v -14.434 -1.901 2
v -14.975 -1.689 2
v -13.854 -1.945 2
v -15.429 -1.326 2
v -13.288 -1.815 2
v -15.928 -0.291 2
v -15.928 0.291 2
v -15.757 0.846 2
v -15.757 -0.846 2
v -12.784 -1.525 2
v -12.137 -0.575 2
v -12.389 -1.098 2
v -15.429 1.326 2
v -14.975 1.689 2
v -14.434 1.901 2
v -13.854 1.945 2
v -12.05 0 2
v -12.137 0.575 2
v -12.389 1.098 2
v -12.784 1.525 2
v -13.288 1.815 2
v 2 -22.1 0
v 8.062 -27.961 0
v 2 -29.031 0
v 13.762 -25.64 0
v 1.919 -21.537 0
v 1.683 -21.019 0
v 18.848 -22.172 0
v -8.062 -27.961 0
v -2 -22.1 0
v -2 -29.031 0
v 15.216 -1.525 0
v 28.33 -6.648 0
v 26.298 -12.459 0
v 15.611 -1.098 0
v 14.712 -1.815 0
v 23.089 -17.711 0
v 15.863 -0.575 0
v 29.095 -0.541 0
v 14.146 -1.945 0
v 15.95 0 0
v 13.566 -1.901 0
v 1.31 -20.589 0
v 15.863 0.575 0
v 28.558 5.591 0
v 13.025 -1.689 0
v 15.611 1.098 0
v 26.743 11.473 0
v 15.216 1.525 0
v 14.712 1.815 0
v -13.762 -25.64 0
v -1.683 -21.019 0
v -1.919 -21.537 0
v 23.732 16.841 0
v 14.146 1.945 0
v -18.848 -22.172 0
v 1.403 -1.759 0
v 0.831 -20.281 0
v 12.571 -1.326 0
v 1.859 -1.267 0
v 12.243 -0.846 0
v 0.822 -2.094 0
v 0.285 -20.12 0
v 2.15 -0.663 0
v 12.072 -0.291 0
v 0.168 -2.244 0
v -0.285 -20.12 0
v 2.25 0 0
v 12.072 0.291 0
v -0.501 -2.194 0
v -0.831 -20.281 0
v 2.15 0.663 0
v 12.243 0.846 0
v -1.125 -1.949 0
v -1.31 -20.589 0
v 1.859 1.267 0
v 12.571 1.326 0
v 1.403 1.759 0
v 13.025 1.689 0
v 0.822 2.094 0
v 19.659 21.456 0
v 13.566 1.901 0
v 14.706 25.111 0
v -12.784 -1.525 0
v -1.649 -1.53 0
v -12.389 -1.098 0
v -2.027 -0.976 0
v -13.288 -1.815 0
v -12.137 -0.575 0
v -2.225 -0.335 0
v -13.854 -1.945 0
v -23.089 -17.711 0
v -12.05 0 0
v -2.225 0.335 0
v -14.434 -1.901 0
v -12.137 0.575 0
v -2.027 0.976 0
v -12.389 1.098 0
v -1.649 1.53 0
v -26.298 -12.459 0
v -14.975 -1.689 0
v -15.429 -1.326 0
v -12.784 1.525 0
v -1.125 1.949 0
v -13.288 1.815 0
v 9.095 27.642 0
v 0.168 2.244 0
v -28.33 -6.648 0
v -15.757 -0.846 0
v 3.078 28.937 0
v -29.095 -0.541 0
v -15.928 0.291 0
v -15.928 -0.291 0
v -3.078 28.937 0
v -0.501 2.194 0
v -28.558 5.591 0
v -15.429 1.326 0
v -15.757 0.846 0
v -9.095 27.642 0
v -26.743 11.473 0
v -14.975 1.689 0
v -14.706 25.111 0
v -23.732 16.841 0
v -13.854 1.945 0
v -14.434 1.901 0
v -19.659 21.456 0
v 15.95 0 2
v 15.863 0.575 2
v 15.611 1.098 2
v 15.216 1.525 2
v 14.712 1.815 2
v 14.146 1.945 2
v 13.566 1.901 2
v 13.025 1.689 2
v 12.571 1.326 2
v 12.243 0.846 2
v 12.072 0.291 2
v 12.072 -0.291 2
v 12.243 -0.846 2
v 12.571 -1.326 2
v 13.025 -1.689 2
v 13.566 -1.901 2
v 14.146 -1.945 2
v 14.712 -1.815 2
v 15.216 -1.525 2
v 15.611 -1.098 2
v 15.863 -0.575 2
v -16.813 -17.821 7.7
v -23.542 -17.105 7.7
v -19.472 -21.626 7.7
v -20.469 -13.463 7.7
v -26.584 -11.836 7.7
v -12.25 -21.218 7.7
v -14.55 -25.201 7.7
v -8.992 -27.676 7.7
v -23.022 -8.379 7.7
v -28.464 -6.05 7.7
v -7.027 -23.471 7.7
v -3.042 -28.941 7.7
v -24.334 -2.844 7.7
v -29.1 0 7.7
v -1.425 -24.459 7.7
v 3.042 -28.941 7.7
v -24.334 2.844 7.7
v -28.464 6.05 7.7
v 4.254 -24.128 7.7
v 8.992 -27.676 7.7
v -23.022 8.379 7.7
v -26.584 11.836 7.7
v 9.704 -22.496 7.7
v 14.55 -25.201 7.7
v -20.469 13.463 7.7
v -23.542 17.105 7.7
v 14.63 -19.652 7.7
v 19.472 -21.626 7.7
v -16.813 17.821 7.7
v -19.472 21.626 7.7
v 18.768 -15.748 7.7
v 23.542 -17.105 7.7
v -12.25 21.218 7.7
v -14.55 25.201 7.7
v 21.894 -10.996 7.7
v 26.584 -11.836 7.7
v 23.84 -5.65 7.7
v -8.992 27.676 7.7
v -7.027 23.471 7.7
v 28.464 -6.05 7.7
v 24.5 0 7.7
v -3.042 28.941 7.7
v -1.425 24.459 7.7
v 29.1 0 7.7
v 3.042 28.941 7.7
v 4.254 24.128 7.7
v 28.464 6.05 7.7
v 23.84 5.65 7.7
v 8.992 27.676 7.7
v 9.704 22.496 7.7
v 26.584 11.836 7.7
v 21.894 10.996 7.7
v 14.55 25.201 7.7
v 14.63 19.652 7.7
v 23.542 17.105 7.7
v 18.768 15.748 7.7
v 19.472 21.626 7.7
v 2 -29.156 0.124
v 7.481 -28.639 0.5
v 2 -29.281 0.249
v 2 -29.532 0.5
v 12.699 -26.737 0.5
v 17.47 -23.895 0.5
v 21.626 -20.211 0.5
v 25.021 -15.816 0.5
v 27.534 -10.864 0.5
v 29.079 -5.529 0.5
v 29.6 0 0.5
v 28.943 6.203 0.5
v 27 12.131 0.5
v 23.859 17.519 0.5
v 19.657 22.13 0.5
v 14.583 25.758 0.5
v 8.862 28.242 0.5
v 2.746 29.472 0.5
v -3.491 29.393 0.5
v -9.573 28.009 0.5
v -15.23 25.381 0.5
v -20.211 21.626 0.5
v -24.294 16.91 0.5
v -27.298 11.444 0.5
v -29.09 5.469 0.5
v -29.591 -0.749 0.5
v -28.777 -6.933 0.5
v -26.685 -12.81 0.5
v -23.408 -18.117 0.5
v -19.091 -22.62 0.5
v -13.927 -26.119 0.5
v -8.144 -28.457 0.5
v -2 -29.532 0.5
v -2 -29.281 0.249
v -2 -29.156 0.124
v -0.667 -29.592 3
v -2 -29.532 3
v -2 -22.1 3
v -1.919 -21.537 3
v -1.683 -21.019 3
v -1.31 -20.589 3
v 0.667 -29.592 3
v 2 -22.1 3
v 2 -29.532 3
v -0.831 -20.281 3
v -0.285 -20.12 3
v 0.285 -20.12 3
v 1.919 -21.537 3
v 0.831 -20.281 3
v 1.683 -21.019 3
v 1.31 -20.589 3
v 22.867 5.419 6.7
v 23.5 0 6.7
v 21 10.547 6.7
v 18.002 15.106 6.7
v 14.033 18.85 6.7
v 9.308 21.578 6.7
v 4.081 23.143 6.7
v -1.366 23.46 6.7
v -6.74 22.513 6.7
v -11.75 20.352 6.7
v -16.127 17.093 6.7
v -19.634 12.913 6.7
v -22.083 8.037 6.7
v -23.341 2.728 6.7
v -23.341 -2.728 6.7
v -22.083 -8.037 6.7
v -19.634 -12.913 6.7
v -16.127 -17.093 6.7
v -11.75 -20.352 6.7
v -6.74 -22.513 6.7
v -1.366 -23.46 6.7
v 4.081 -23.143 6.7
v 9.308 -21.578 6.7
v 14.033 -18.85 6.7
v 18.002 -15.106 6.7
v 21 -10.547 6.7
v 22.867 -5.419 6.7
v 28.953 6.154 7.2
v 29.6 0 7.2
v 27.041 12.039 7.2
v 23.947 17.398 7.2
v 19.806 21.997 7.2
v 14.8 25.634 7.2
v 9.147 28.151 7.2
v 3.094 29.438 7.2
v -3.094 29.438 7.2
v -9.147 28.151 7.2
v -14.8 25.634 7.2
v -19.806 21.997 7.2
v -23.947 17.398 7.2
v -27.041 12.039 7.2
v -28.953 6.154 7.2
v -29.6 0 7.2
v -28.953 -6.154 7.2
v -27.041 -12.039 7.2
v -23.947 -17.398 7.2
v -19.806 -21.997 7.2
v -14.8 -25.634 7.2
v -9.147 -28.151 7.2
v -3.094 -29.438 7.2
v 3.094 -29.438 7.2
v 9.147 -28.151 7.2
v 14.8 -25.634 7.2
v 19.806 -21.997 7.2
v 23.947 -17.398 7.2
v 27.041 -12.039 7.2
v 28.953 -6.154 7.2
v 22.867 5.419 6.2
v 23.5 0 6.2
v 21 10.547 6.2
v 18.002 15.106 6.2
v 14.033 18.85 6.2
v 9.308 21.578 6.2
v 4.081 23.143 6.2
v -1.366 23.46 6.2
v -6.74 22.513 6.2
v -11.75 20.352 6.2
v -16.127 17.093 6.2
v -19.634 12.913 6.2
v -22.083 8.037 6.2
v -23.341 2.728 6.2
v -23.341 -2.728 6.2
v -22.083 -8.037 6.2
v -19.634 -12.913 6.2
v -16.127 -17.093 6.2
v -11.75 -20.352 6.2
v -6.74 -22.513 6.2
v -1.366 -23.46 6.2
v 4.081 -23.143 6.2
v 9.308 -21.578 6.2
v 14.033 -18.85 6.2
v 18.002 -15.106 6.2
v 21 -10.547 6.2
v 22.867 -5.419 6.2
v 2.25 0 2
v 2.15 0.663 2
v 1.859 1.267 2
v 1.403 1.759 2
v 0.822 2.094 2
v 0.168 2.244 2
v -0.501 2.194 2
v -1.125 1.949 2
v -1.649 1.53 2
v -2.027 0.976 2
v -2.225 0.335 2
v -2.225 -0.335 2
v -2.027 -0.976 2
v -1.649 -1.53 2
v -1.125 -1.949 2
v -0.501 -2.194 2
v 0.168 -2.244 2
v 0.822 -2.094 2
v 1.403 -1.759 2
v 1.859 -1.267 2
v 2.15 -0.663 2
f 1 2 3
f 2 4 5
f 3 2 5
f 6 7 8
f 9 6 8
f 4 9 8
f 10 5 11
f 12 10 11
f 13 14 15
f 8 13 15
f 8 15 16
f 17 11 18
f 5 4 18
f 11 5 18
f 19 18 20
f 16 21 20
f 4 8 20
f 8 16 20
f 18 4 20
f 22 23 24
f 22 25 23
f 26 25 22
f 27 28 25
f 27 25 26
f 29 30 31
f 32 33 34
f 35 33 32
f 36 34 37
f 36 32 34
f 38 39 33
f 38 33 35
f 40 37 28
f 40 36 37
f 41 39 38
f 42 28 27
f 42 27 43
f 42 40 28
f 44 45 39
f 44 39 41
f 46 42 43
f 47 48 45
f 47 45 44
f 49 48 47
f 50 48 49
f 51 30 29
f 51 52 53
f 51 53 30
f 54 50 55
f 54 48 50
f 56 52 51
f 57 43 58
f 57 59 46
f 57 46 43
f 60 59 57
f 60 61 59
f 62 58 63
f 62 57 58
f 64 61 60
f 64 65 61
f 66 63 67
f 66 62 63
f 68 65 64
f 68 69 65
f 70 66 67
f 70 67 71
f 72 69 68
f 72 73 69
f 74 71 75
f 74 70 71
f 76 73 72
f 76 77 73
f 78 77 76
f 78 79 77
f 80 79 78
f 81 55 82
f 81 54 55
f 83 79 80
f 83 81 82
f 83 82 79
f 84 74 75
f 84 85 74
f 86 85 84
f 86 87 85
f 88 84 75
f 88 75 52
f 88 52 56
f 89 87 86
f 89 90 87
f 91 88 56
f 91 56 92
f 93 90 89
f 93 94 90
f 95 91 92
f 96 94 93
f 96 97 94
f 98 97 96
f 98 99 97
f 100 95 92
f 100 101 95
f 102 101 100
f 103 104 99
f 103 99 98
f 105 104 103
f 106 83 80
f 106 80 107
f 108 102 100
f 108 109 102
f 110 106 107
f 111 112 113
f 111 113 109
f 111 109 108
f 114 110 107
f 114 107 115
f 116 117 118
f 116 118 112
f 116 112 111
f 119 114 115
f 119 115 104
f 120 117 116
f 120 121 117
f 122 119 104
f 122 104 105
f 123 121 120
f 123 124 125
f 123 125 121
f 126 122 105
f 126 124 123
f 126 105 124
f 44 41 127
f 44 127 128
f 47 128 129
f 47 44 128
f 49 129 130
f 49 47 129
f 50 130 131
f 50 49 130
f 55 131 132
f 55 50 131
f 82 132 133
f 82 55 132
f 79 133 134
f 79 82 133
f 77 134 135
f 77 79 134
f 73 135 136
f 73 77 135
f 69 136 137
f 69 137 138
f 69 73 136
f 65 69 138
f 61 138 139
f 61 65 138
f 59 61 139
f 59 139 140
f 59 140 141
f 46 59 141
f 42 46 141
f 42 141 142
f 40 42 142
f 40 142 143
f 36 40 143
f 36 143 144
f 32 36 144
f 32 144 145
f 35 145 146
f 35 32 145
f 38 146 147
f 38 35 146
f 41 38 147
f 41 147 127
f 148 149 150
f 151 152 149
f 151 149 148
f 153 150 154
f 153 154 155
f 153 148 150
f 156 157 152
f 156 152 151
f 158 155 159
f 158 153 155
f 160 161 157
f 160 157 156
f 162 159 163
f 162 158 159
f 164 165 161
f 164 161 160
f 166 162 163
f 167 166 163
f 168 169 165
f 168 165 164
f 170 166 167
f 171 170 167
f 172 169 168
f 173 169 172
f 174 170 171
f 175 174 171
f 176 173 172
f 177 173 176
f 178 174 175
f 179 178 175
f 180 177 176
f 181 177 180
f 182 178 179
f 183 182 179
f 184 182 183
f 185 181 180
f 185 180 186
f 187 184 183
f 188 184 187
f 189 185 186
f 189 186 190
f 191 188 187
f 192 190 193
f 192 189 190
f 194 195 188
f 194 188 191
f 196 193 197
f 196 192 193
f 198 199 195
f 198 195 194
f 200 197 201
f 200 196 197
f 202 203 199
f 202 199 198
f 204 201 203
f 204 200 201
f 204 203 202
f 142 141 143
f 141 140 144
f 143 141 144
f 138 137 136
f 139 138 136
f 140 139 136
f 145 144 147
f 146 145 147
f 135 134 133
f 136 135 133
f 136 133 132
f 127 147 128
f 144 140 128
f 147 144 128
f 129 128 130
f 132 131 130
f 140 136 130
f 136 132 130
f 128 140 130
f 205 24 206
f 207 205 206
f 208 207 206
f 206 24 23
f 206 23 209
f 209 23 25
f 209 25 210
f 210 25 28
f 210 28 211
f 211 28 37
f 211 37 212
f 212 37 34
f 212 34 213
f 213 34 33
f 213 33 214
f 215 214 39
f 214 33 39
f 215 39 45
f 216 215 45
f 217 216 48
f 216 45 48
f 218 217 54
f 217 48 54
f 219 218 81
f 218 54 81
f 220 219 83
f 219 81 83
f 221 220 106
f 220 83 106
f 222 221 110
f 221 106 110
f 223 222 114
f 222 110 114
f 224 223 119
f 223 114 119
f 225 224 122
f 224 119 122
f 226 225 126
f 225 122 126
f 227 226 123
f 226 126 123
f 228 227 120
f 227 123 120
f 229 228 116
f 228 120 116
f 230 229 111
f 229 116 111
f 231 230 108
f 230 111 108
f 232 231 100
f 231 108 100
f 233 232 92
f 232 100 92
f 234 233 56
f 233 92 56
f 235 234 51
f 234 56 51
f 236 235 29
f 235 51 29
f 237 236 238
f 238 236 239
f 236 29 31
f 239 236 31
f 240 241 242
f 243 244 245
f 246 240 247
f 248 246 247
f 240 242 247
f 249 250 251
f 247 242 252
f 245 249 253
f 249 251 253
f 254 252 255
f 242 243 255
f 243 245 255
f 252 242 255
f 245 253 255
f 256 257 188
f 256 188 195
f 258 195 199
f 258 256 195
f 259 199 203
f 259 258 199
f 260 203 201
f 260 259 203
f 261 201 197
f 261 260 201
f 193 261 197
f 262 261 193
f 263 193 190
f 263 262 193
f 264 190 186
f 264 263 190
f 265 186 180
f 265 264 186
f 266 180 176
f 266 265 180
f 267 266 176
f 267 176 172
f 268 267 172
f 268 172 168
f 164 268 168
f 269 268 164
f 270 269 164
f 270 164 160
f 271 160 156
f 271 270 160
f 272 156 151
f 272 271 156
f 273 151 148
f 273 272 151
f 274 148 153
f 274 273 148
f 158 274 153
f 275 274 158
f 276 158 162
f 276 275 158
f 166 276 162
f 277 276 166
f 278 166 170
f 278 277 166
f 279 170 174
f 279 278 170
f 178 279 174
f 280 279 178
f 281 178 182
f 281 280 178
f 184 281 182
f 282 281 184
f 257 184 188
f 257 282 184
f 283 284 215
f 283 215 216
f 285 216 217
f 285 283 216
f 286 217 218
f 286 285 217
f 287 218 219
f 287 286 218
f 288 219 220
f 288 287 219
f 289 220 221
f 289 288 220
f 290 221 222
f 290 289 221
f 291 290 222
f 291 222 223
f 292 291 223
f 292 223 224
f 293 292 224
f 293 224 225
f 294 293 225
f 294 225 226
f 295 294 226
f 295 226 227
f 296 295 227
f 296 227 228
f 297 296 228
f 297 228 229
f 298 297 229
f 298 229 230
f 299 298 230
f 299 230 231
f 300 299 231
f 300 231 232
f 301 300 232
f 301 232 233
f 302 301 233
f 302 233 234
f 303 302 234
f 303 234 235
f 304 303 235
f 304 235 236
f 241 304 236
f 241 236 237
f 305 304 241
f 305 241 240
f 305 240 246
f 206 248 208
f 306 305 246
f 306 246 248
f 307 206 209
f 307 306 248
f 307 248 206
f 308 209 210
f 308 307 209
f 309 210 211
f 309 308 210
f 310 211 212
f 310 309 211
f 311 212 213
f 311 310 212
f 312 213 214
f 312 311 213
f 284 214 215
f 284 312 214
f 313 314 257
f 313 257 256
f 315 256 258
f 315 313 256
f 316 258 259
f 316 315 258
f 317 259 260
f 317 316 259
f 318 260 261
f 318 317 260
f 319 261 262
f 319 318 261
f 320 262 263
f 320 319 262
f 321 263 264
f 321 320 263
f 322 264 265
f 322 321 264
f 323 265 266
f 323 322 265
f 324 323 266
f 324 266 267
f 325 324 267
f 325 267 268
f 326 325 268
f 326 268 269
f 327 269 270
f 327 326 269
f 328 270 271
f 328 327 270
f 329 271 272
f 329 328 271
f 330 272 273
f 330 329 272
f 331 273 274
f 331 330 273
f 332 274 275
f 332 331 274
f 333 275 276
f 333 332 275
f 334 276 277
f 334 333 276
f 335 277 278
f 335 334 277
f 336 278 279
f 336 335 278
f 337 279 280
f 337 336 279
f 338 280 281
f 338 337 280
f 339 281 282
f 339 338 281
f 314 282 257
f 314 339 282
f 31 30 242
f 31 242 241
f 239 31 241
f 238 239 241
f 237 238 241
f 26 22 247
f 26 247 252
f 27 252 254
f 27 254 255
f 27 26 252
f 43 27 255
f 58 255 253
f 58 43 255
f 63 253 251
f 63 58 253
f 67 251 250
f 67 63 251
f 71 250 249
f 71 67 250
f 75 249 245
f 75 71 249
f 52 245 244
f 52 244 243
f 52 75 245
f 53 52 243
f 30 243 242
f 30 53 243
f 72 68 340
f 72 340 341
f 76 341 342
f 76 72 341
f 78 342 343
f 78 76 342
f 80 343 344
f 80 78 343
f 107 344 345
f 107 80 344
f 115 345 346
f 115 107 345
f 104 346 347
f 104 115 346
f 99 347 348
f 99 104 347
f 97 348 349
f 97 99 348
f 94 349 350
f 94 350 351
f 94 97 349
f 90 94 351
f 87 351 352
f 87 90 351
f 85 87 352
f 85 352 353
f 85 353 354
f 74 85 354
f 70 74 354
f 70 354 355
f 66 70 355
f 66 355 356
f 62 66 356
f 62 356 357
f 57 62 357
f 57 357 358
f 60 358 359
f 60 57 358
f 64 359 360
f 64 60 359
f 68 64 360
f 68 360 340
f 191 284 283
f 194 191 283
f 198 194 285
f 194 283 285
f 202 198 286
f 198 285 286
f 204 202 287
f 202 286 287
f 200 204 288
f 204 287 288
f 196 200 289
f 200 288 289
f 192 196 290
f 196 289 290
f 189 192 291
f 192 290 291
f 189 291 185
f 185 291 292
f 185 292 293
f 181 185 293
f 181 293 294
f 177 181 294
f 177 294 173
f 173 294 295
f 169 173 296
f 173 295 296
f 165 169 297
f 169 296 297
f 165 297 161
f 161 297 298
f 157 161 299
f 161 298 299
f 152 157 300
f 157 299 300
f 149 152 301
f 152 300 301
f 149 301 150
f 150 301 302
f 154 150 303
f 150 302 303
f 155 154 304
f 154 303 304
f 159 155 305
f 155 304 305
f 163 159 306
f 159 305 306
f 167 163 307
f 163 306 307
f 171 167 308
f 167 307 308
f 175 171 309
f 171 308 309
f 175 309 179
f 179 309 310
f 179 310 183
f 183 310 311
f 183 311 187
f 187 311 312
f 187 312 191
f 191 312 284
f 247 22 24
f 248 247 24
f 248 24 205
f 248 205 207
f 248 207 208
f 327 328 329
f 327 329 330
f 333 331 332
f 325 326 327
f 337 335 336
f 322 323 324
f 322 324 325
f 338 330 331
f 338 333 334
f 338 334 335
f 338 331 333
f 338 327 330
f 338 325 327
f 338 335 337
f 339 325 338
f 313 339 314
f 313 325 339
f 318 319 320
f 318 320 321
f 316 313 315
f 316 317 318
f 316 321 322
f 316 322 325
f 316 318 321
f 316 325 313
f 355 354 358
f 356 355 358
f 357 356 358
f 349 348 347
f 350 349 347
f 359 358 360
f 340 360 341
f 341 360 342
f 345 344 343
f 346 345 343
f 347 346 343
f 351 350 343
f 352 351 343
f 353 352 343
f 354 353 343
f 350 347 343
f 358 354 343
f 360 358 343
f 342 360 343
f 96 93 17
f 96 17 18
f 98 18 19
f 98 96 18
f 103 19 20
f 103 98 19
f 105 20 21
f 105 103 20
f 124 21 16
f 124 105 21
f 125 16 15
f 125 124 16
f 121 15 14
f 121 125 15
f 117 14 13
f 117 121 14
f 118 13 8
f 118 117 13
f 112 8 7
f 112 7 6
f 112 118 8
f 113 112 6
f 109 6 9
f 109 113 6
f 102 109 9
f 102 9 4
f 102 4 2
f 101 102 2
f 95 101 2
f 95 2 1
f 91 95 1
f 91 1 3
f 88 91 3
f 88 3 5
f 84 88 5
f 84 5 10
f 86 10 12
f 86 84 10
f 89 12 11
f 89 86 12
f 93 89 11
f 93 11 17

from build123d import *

# Parameters (mm, degrees)
CHAMFER_SIZE    = 1
SKETCH001_R     = 2.25
SKETCH001_R_2   = 1.95
POCKET_DEPTH    = 2
CHAMFER001_SIZE = 0.5
POCKET001_DEPTH = 3


with BuildPart() as part:
    # Sketch (on XZ_Plane of Origin) → Revolution (revolve)
    with BuildSketch(Plane.XZ):
        Polygon((0, 0), (29.6, 0), (29.6, 7.7), (23.5, 7.7), (23.5, 6.2), (0, 6.2), align=None)
    revolve(axis=Axis((0, 0, 0), (0, 0, 1)))

    # Chamfer
    chamfer_edges = [part.edges().sort_by_distance(p)[0] for p in [
        (-23.5, 0, 7.7),
    ]]
    chamfer(chamfer_edges, length=CHAMFER_SIZE)

    # Sketch001 (on XY_Plane of Origin) → Pocket (cut)
    with BuildSketch(Plane.XY):
        Circle(SKETCH001_R)
        with Locations((14, 0)):
            Circle(SKETCH001_R_2)
        with Locations((-14, 0)):
            Circle(SKETCH001_R_2)
    extrude(amount=POCKET_DEPTH, mode=Mode.SUBTRACT)

    # Chamfer001
    chamfer001_edges = [part.edges().sort_by_distance(p)[0] for p in [
        (-29.6, 0, 7.7),
        (-29.6, 0, 0),
    ]]
    chamfer(chamfer001_edges, length=CHAMFER001_SIZE)

    # Sketch002 (on XY_Plane of Origin) → Pocket001 (cut)
    with BuildSketch(Plane.XY):
        with BuildLine():
            ThreePointArc((2, -22.1), (0, -20.1), (-2, -22.1))
            Line((-2, -22.1), (-2, -31.1))
            ThreePointArc((-2, -31.1), (0, -33.1), (2, -31.1))
            Line((2, -22.1), (2, -31.1))
        make_face()
    extrude(amount=POCKET001_DEPTH, mode=Mode.SUBTRACT)


solid = part.part
